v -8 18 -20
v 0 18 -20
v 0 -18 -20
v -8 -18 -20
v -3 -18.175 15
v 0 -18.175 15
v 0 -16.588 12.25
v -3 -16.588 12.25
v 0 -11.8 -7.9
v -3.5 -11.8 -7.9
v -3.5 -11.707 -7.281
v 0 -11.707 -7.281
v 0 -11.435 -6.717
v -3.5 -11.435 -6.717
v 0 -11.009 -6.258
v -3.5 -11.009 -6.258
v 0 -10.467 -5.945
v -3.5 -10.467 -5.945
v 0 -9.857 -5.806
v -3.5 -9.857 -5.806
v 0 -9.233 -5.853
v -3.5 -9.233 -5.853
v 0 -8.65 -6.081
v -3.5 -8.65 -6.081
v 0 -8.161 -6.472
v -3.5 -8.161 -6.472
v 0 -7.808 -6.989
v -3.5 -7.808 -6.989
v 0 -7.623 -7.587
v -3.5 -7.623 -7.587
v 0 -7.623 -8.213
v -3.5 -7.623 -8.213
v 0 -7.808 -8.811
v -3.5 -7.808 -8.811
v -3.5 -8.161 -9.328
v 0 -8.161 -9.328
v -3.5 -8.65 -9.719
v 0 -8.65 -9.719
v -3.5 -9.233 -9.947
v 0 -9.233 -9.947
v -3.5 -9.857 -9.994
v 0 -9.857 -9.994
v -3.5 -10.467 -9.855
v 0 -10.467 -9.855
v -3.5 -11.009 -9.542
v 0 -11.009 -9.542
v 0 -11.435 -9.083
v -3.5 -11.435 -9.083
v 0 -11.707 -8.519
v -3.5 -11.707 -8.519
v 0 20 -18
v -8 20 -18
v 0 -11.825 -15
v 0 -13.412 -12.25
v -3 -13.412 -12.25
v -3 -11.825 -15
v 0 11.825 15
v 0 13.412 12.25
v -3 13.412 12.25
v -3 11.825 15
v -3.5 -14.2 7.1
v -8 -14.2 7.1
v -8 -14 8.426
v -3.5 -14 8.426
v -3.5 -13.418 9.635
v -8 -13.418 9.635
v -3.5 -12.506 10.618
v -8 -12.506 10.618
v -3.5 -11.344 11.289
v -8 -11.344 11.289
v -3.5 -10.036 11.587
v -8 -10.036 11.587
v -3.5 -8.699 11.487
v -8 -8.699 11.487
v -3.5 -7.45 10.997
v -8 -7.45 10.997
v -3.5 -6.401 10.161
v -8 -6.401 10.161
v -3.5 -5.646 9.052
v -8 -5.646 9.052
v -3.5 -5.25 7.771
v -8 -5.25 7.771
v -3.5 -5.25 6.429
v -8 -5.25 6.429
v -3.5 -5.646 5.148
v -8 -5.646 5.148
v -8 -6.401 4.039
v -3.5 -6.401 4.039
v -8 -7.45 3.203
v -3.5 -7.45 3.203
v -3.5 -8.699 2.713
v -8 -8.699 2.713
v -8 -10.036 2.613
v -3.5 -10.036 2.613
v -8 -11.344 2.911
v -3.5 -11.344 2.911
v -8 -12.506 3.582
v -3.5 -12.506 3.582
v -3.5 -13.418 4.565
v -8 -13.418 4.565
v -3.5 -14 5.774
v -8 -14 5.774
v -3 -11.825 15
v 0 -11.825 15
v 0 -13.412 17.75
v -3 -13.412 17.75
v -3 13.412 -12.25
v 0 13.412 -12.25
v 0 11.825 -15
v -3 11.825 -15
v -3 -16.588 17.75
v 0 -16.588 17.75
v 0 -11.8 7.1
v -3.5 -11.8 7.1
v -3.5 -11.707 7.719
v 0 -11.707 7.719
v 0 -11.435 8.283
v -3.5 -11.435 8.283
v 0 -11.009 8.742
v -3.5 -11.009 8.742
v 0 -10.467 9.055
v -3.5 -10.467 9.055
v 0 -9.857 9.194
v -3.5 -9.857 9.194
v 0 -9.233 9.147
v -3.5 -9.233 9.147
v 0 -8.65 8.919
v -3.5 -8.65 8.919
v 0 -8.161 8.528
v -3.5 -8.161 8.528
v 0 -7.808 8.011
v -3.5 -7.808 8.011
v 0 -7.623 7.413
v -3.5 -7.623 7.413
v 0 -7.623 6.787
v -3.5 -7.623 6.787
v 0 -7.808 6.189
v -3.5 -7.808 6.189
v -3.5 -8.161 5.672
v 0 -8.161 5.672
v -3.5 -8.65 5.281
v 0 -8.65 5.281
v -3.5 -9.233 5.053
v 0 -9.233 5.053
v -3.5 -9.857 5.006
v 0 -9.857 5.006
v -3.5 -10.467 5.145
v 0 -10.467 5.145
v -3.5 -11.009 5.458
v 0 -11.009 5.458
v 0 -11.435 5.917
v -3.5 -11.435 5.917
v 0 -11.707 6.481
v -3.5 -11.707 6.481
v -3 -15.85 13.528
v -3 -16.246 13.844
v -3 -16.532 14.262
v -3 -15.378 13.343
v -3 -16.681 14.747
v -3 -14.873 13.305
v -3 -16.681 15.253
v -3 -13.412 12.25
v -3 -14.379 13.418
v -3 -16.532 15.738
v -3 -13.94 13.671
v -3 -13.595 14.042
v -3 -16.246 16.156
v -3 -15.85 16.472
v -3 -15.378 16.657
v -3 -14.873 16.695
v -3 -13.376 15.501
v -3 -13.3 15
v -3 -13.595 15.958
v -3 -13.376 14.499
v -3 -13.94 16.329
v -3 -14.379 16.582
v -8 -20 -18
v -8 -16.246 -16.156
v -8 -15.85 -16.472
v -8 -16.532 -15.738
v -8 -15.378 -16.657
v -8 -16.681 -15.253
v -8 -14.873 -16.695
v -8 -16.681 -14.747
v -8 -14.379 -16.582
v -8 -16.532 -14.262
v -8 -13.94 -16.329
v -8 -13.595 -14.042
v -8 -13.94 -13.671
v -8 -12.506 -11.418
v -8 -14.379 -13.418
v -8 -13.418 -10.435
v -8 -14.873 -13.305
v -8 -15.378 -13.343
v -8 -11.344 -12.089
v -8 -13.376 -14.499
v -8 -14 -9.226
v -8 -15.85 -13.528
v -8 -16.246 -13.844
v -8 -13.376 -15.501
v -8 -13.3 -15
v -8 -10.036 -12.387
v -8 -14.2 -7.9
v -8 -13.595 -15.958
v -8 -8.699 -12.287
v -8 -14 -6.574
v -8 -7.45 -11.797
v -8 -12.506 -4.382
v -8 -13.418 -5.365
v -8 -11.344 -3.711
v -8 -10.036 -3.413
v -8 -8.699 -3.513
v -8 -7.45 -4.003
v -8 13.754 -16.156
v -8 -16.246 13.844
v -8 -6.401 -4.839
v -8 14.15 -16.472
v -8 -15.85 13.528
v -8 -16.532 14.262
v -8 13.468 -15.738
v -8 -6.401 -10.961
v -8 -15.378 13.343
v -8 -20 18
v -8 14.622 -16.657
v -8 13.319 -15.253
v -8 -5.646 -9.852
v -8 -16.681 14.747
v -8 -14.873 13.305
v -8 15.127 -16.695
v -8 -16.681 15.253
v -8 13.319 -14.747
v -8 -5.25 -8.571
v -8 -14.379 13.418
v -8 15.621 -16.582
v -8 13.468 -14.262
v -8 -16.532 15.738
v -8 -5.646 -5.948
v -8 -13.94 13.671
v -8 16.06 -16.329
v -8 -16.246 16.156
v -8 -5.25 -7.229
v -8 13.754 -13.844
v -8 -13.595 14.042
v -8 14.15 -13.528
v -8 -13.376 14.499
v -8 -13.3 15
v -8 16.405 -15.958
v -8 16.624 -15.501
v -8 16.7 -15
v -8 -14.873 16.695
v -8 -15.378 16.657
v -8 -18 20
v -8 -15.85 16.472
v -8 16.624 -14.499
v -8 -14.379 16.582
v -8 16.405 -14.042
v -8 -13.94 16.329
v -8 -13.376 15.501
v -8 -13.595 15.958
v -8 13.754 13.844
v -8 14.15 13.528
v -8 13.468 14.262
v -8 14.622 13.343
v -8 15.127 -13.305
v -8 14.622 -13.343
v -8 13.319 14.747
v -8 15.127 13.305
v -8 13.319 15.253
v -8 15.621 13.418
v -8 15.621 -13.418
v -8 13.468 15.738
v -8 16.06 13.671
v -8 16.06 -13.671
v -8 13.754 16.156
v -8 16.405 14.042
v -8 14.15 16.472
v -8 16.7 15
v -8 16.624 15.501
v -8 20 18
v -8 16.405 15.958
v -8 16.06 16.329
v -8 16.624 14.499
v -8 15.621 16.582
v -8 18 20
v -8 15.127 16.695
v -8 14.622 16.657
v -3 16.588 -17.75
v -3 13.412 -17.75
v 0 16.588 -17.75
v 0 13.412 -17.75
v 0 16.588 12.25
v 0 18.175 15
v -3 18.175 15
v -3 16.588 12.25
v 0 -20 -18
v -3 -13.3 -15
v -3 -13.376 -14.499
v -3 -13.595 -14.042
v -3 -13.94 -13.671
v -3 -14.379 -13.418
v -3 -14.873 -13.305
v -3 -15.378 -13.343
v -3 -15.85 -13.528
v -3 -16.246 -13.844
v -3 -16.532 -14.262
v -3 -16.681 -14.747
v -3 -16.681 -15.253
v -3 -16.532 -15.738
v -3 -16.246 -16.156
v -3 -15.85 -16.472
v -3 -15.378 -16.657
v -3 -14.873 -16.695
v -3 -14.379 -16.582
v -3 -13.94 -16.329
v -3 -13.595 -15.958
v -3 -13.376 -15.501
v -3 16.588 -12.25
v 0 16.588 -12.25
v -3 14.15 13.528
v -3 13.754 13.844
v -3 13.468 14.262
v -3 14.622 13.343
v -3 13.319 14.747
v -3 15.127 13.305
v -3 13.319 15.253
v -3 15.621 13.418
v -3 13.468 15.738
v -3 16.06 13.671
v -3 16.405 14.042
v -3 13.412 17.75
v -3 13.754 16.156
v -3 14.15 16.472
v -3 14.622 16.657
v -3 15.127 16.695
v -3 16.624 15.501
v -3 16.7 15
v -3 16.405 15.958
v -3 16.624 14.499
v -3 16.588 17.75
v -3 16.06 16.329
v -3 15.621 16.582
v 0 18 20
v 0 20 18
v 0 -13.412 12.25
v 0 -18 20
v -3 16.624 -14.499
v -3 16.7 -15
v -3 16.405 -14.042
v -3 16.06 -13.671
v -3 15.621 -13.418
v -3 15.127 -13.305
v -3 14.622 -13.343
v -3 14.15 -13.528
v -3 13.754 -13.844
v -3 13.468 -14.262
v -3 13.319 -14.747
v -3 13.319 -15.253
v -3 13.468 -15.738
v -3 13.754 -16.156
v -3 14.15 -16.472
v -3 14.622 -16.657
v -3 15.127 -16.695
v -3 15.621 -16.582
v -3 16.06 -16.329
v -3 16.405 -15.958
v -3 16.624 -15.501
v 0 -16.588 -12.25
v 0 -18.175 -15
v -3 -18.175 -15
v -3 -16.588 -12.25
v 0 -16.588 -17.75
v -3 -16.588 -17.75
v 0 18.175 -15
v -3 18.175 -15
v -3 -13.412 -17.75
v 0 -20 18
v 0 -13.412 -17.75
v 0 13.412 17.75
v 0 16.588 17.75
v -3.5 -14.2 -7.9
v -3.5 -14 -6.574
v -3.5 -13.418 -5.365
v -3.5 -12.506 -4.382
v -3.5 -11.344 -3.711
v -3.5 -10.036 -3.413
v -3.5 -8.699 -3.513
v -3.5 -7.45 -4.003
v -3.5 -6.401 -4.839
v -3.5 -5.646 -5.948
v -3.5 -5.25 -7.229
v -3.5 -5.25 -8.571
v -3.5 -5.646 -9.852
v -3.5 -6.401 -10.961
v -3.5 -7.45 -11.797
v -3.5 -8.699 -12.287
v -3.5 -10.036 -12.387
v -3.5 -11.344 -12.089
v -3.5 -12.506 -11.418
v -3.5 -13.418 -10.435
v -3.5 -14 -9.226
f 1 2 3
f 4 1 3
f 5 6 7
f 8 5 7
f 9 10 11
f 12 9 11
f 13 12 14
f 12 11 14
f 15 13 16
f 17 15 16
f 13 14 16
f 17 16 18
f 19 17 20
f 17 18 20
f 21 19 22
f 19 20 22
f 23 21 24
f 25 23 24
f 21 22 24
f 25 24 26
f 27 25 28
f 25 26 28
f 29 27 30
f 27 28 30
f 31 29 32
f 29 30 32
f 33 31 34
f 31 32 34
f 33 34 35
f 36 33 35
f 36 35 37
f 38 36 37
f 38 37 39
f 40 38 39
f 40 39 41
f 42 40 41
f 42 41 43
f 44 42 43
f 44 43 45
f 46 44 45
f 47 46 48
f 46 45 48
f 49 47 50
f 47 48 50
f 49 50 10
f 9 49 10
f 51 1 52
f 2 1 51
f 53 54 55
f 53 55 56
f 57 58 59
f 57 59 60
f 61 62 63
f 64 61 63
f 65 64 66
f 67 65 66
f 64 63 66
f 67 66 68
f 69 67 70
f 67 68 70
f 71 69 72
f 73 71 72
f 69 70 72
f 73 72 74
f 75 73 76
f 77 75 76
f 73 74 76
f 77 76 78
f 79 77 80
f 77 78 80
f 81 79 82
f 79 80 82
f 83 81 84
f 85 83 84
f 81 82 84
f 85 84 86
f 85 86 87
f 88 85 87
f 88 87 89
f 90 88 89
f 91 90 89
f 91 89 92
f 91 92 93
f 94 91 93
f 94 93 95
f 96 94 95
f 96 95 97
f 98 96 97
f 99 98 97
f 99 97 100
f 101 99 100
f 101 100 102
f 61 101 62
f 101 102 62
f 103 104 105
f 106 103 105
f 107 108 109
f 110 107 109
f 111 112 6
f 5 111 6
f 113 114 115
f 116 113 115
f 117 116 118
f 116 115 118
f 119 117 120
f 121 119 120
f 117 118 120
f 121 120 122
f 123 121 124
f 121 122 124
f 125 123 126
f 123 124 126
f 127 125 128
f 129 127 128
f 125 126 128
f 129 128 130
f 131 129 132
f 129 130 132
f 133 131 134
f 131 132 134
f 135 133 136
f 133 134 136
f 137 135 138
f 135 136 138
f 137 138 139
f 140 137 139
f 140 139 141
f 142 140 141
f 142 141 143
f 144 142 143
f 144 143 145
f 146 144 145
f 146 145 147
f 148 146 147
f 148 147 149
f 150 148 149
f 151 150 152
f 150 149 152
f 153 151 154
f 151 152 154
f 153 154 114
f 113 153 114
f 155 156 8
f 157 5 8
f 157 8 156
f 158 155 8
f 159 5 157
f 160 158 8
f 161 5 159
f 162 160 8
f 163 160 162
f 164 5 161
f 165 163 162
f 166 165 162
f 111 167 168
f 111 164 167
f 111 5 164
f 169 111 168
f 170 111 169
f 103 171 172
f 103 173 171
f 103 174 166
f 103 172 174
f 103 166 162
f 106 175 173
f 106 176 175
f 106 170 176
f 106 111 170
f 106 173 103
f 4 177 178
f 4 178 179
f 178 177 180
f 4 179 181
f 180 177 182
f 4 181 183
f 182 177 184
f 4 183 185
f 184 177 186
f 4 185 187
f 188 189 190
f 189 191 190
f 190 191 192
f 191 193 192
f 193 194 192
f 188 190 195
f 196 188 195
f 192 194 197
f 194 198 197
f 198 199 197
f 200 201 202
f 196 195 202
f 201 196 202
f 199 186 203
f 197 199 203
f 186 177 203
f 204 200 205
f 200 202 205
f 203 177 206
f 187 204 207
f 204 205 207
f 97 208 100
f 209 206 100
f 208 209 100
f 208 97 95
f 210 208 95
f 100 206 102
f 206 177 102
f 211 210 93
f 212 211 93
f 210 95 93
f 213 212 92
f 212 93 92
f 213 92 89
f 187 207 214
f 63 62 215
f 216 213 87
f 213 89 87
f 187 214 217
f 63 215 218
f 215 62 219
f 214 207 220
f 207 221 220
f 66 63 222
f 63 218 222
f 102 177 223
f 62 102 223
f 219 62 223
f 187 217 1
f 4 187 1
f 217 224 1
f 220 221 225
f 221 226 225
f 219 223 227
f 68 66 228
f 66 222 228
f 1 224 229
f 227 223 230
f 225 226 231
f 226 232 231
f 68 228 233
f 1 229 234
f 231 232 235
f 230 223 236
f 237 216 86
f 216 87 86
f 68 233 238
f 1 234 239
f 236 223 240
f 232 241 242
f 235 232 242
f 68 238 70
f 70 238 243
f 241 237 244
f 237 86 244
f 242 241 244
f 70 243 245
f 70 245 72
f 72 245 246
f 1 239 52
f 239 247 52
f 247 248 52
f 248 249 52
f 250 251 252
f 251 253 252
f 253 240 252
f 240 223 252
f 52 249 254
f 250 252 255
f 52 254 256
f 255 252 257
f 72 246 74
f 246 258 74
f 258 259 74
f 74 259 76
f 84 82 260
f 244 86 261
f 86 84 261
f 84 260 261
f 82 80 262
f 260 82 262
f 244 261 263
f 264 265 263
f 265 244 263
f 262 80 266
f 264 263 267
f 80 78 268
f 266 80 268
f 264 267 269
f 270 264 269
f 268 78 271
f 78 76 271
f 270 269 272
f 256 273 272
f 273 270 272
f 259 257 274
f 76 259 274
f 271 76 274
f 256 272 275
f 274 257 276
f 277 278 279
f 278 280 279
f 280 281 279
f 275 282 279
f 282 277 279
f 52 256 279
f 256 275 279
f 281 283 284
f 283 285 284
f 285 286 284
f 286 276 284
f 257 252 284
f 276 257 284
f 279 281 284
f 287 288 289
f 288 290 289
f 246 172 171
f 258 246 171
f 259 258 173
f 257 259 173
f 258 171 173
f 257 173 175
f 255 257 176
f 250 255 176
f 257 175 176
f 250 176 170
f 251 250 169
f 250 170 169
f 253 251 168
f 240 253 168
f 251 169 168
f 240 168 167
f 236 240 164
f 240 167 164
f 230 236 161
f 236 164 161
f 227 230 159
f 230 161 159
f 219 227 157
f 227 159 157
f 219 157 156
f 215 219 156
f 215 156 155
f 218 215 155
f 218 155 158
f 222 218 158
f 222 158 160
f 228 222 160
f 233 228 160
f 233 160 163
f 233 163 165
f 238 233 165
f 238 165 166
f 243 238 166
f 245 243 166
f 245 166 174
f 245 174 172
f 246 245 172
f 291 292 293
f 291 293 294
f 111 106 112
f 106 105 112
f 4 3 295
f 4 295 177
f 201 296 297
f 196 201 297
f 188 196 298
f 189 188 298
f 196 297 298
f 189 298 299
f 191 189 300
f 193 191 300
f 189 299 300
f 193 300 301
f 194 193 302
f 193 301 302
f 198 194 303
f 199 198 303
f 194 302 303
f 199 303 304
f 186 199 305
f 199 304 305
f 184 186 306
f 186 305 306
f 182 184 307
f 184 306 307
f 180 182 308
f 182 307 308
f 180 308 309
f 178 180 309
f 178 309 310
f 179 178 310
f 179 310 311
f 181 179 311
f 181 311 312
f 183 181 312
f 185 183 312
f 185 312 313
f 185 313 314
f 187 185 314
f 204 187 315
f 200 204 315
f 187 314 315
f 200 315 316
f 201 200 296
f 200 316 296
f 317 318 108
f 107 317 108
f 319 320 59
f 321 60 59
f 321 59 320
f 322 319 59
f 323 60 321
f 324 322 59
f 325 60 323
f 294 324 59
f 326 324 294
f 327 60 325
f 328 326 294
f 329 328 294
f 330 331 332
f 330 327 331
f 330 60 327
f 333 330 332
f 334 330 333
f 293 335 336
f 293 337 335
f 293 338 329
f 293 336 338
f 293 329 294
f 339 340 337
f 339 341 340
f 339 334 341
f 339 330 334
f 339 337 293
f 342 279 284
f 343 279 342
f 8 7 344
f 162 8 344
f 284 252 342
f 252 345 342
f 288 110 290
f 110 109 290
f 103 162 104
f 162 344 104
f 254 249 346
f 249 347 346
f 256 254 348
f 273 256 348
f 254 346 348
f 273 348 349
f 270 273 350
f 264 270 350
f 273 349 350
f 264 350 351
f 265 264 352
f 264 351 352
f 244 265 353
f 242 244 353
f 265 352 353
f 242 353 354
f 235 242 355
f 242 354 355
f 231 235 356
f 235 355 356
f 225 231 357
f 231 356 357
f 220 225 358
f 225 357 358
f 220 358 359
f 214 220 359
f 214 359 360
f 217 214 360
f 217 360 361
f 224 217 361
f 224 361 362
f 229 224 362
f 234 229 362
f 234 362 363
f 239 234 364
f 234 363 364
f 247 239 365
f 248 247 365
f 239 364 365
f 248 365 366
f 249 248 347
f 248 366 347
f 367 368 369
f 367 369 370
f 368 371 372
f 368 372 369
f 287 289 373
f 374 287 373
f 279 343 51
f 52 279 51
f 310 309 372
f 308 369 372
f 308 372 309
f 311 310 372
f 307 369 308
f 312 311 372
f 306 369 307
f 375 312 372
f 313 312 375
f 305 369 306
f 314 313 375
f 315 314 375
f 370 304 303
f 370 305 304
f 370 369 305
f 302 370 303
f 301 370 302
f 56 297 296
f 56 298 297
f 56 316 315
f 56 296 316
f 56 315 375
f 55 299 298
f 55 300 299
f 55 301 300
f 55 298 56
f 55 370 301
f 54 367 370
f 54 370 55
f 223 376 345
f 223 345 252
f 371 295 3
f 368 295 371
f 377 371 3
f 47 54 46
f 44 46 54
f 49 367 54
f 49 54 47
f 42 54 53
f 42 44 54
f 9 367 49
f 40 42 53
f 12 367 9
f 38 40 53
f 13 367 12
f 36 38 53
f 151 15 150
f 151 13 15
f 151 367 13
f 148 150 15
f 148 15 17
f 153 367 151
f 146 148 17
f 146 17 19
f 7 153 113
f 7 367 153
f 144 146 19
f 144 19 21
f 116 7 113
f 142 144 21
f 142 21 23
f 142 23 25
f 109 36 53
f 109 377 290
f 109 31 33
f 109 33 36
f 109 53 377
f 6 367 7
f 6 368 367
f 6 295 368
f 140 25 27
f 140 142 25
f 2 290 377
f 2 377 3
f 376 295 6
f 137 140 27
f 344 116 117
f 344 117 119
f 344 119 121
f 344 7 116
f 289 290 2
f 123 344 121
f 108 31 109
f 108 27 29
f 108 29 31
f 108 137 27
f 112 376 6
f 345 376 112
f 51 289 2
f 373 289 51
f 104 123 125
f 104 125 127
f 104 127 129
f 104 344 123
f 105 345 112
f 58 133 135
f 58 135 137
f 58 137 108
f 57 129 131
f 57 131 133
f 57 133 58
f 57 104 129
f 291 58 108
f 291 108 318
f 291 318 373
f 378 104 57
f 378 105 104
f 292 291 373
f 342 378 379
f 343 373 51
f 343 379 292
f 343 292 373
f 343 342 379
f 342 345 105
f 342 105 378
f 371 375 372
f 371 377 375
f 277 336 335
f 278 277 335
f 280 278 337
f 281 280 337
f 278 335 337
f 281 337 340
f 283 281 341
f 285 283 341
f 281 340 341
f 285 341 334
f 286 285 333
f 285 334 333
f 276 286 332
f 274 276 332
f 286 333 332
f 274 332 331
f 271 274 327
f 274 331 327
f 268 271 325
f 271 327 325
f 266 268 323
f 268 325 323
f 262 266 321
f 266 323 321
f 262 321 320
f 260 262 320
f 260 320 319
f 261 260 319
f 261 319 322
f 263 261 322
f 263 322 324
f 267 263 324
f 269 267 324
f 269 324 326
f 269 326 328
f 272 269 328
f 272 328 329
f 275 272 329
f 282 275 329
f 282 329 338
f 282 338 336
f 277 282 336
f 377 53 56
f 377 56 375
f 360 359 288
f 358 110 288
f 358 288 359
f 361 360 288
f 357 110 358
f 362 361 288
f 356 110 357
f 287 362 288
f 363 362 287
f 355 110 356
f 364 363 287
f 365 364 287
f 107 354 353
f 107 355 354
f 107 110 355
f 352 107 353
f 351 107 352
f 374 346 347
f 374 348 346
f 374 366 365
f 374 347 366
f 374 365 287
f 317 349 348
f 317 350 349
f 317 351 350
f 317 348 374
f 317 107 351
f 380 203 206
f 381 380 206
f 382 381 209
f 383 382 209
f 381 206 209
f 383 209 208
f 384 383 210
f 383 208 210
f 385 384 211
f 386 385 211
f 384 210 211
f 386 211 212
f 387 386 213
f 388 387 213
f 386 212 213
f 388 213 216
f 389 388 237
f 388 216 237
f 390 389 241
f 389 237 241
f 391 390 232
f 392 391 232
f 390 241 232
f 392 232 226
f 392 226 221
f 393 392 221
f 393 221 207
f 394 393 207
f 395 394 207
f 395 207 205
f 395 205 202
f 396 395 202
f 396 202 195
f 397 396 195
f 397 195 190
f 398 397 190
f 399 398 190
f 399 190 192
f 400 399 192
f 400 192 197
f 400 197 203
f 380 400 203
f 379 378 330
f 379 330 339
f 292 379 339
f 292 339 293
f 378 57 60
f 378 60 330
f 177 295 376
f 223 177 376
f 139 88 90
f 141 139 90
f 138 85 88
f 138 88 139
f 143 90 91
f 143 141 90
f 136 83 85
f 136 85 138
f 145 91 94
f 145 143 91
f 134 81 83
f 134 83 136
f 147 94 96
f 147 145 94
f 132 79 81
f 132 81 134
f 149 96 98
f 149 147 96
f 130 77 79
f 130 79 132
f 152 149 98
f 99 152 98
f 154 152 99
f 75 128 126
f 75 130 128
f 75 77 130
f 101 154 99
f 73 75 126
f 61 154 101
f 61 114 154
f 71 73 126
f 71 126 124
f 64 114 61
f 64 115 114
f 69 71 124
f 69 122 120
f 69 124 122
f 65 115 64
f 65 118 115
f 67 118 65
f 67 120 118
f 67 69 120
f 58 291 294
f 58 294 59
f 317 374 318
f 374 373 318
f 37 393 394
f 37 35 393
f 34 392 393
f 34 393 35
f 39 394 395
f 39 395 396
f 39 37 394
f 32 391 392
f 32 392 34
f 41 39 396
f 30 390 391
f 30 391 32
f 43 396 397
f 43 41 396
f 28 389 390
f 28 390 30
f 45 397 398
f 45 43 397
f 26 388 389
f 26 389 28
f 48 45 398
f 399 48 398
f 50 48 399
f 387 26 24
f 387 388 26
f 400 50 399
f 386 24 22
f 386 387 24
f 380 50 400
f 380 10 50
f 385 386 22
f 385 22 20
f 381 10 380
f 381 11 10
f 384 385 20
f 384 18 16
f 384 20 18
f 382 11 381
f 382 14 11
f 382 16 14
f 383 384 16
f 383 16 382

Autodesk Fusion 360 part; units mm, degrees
sketch "ValveAdapterBase" plane through (0, 0, 0) normal (1, 0, 0) x (0, 1, 0) in component "ValveHalterung"
  line L0 (-15, 15) -> (15, 15) construction
  line L1 (15, 15) -> (15, -15) construction
  line L2 (15, -15) -> (-15, -15) construction
  line L3 (-15, -15) -> (-15, 15) construction
  line L4 (-15, 15) -> (15, -15) construction
  line L5 (15, 15) -> (-15, -15) construction
  circle A0 centre (15, 15) radius 1.7
  circle A1 centre (15, -15) radius 1.7
  circle A2 centre (-15, -15) radius 1.7
  circle A3 centre (-15, 15) radius 1.7
  line L6 (-20, 20) -> (20, 20)
  line L7 (20, 20) -> (20, -20)
  line L8 (20, -20) -> (-20, -20)
  line L9 (-20, -20) -> (-20, 20)
  line L10 (-20, 20) -> (20, -20) construction
  line L11 (20, 20) -> (-20, -20) construction
  line L12 (-16.5877, 17.75) -> (-18.1754, 15)
  line L13 (-18.1754, 15) -> (-16.5877, 12.25)
  line L14 (-16.5877, 12.25) -> (-13.4123, 12.25)
  line L15 (-13.4123, 12.25) -> (-11.8246, 15)
  line L16 (-11.8246, 15) -> (-13.4123, 17.75)
  line L17 (-13.4123, 17.75) -> (-16.5877, 17.75)
  line L18 (0, 33) -> (0, -35) construction
  line L19 (41, 0) -> (-42, 0) construction
  line L20 (11.8246, 15) -> (13.4123, 17.75)
  line L21 (13.4123, 17.75) -> (16.5877, 17.75)
  line L22 (16.5877, 17.75) -> (18.1754, 15)
  line L23 (18.1754, 15) -> (16.5877, 12.25)
  line L24 (13.4123, 12.25) -> (11.8246, 15)
  line L25 (16.5877, 12.25) -> (13.4123, 12.25)
  line L26 (-18.1754, -15) -> (-16.5877, -12.25)
  line L27 (-16.5877, -12.25) -> (-13.4123, -12.25)
  line L28 (-13.4123, -12.25) -> (-11.8246, -15)
  line L29 (-11.8246, -15) -> (-13.4123, -17.75)
  line L30 (-16.5877, -17.75) -> (-18.1754, -15)
  line L31 (-13.4123, -17.75) -> (-16.5877, -17.75)
  line L32 (18.1754, -15) -> (16.5877, -12.25)
  line L33 (16.5877, -12.25) -> (13.4123, -12.25)
  line L34 (13.4123, -12.25) -> (11.8246, -15)
  line L35 (11.8246, -15) -> (13.4123, -17.75)
  line L36 (16.5877, -17.75) -> (18.1754, -15)
  line L37 (13.4123, -17.75) -> (16.5877, -17.75)
  circle A4 centre (7.3158, 9.4632) radius 2.1
  point P0 (-15, 15)
  dimension "d4" = 30
  dimension "d7" = 3.4
  dimension "d8" = 3.4
  dimension "d9" = 3.4
  dimension "d10" = 3.4
  dimension "d12" = 40
  dimension "d17" = 2.75
  dimension "d22" = 4.2
extrude "Extrude1" add sketch "ValveAdapterBase" against normal blind 8 contours L6 L7 L8 L9 | L12 L13 L14 L15 L16 L17 | L20 L21 L22 L23 L24 L25 | L26 L27 L28 L29 L30 L31 | L32 L33 L34 L35 L36 L37 | A4 in component "ValveHalterung"
extrude "Extrude2" cut sketch "ValveAdapterBase" against normal blind 3 contours L12 L13 L14 L15 L16 L17 | L20 L21 L22 L23 L24 L25 | L26 L27 L28 L29 L30 L31 | L32 L33 L34 L35 L36 L37 in component "ValveHalterung"
sketch "ValveAdapterScrews" plane through (-8, 0, 0) normal (-1, 0, 0) x (0, -1, 0) in component "ValveHalterung"
  circle A0 centre (-15, 15) radius 1.7
  circle A1 centre (15, 15) radius 1.7
  circle A2 centre (-15, -15) radius 1.7
  circle A3 centre (15, -15) radius 1.7
  line L0 (-20, -20) -> (20, -20)
  line L1 (20, -20) -> (20, 20)
  line L2 (20, 20) -> (-20, 20)
  line L3 (-20, 20) -> (-20, -20)
  line L4 (-15, 11) -> (15, 11) construction
  line L5 (15, 11) -> (15, -11) construction
  line L6 (15, -11) -> (-15, -11) construction
  line L7 (-15, -11) -> (-15, 11) construction
  line L8 (-15, 11) -> (15, -11) construction
  line L9 (15, 11) -> (-15, -11) construction
  circle A4 centre (9.7, 7.1) radius 2.1
  line L10 (11.8, 7.1) -> (11.8, 11) construction
  line L11 (9.7, 9.2) -> (15, 9.2) construction
  line L12 (31, -0.4) -> (-34, -0.4) construction
  circle A5 centre (9.7, -7.9) radius 2.1
  circle A6 centre (9.7, 7.1) radius 4.5
  circle A7 centre (9.7, -7.9) radius 4.5
  dimension "d35" = 30
  dimension "d36" = 22
  dimension "d37" = 4.2
  dimension "d38" = 3.2
  dimension "d39" = 1.8
  dimension "d42" = 9
  dimension "d47" = 15
extrude "Extrude3" cut sketch "ValveAdapterScrews" against normal up to surface (8 mm away) contours A4 | A5 in component "ValveHalterung"
extrude "Extrude4" cut sketch "ValveAdapterScrews" against normal blind 4.5 contours A6 | A7 in component "ValveHalterung"
chamfer "Chamfer1" distance 2 angle 45 4 edges at (-4, -20, 20) (-4, 20, 20) (-4, -20, -20) (-4, 20, -20) in component "ValveHalterung"
component "ValveHalterung" placed x (1, 0, 0) y (0, 1, 0) z (0, 0, 1) at (0, 0, 0)
equation "Staging_Plate_Spacing = 30 mm" comment "M3 Screws"
equation "d4 = Staging_Plate_Spacing"
equation "M3_Screw_Diameter = 3.4 mm"
equation "d7 = M3_Screw_Diameter"
equation "d8 = M3_Screw_Diameter"
equation "d9 = M3_Screw_Diameter"
equation "d10 = M3_Screw_Diameter"
equation "Outer_Edge = 40 mm"
equation "d12 = Outer_Edge"
equation "M3_Nut_Edge = 5.5 mm"
equation "d17 = M3_Nut_Edge / 2"
equation "M3_Nut_Extrusion = 3 mm"
equation "d19 = -M3_Nut_Extrusion"
equation "Valve_Screw_Diameter = 4.2 mm" comment "M4 Screw?"
equation "d22 = Valve_Screw_Diameter"
equation "d37 = Valve_Screw_Diameter"
equation "d42 = Valve_Screw_Head_Diameter"
equation "Valve_Screw_Head_Diameter = 9 mm"
